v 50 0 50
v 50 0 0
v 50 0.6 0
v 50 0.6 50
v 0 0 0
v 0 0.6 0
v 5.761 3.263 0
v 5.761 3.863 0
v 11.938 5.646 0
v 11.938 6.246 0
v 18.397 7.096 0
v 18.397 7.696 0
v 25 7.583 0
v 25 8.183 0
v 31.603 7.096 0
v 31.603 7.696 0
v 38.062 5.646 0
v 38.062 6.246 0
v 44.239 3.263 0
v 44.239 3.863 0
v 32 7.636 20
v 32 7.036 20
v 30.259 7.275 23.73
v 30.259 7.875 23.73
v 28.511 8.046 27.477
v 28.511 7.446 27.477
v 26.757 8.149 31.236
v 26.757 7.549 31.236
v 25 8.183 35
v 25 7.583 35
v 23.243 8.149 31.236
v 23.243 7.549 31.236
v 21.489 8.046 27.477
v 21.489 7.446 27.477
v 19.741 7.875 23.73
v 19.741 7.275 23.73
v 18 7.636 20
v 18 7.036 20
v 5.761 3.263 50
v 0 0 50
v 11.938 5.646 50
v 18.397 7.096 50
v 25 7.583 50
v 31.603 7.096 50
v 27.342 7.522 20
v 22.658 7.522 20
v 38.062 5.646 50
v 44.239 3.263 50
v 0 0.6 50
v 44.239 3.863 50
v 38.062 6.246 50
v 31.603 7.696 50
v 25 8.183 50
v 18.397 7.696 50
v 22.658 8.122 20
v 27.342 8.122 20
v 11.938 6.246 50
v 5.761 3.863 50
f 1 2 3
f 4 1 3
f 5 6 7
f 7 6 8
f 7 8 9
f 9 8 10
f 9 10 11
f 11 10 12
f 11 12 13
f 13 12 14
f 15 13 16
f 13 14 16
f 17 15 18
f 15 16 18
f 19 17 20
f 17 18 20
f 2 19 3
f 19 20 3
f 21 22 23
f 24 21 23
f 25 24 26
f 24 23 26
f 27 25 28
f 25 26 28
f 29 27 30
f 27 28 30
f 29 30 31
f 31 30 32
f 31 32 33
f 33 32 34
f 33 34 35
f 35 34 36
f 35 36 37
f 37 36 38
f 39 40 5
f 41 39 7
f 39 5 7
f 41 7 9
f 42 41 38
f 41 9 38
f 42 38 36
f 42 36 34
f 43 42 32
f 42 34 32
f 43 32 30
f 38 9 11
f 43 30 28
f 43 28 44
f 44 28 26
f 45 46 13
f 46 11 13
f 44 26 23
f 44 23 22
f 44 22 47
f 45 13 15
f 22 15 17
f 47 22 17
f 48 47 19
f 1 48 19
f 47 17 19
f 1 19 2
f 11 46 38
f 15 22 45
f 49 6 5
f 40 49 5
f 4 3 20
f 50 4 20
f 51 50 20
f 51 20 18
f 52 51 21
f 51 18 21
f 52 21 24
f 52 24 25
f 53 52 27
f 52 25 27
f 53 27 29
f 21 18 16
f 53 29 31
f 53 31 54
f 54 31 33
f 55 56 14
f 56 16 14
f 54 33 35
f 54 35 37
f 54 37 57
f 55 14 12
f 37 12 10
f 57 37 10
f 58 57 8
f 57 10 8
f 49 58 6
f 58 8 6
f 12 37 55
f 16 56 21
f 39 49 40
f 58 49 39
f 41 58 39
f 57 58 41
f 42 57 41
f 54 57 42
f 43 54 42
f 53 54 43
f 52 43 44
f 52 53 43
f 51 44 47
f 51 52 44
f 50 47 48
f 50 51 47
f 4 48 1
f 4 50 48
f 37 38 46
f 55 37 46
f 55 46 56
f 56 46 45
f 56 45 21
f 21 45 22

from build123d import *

# Parameters (mm, degrees)
F1_DEPTH = 50
F3_DEPTH = 25


with BuildPart() as f1:
    # F0 (on Top) → F1 (new body)
    with BuildSketch(Plane.XY):
        with BuildLine():
            ThreePointArc((0, 0), (25, 7.583426), (50, 0))
            Line((50, 0), (50, 0.6))
            ThreePointArc((50, 0.6), (25, 8.183426), (0, 0.6))
            Line((0, 0.6), (0, 0))
        make_face()
    extrude(amount=F1_DEPTH)

    # F2 (on Front) → F3 (cut)
    with BuildSketch(Plane.XZ):
        Polygon((25, 35), (18, 20), (32, 20), align=None)
    extrude(amount=-F3_DEPTH, mode=Mode.SUBTRACT)


solid = f1.part
